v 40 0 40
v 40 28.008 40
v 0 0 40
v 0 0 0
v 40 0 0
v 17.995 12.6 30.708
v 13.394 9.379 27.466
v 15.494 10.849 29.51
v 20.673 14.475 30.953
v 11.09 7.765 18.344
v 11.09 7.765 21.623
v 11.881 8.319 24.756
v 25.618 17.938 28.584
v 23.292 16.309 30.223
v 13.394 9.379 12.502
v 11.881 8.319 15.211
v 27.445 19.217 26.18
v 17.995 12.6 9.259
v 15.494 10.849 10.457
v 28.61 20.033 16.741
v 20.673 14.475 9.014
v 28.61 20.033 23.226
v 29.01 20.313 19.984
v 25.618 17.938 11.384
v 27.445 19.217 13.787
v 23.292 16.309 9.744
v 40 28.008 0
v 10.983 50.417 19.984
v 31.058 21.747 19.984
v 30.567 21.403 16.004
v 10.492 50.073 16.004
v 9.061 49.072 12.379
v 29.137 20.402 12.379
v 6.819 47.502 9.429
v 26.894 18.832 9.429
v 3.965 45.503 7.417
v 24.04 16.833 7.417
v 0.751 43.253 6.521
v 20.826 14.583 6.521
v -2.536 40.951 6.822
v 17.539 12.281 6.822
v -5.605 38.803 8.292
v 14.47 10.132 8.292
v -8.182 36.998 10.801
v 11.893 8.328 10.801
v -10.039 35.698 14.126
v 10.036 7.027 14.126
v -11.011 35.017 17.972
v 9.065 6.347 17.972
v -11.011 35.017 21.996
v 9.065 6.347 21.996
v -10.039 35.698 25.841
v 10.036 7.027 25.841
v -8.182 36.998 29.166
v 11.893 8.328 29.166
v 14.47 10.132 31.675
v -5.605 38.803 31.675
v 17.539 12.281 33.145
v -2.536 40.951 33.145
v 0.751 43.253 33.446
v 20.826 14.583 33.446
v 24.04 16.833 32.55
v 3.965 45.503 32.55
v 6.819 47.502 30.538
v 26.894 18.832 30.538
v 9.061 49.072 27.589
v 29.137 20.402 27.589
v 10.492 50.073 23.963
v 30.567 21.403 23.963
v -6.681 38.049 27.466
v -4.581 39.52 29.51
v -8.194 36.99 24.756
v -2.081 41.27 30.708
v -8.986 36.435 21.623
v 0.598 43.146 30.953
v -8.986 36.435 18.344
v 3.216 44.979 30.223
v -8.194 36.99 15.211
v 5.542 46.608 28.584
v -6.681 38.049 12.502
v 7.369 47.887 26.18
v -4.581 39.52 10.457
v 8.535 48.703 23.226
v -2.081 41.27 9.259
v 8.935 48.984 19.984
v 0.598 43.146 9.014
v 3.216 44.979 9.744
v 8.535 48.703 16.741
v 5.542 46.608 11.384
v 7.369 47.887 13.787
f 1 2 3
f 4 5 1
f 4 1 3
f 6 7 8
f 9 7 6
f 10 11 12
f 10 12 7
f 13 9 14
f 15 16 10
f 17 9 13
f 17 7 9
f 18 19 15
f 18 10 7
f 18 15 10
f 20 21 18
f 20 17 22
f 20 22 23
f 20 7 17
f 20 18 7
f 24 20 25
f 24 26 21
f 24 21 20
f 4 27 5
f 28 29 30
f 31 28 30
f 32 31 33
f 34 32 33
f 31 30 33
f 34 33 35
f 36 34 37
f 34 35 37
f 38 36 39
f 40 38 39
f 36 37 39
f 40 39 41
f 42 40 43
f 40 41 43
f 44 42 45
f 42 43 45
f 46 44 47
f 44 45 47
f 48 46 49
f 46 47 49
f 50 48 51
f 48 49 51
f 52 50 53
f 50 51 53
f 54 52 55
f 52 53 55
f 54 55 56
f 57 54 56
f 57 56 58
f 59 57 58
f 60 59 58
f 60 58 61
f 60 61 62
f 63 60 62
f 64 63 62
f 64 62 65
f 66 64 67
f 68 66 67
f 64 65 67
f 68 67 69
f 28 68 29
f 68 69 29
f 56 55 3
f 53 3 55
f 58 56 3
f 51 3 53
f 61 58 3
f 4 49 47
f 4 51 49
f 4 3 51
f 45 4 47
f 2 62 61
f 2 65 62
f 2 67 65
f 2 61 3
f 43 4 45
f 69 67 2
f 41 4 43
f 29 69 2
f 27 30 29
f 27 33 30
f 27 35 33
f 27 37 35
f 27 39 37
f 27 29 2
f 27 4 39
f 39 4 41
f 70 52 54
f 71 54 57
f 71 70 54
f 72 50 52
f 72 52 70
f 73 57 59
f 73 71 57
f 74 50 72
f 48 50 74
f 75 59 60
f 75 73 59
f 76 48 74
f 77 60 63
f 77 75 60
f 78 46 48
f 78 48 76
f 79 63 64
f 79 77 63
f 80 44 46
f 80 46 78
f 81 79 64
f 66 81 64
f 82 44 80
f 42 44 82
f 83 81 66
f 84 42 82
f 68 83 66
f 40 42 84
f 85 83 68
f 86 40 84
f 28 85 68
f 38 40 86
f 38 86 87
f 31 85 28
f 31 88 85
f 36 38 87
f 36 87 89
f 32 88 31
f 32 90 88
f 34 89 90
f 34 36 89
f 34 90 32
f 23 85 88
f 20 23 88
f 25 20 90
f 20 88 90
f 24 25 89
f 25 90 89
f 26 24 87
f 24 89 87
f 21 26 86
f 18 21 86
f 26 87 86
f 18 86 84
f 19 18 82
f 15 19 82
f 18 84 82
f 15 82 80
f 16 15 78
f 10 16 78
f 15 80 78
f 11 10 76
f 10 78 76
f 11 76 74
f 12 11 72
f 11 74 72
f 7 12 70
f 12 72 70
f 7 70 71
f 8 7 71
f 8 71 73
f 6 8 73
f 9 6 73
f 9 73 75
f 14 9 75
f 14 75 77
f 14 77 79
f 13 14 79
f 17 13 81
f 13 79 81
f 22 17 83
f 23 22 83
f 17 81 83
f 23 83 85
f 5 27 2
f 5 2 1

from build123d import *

# Parameters (mm, degrees)
BOSS_EXTRUDE1_DEPTH = 40
SKETCH3_R           = 13.5
BOSS_EXTRUDE2_DEPTH = 35
SKETCH4_R           = 11
CUT_EXTRUDE1_DEPTH  = 35


with BuildPart() as part:
    # Sketch2 → Boss-Extrude1 (new body)
    with BuildSketch(Plane.XY):
        Polygon((0, 0), (40, 28.008301528), (40, 0), align=None)
    extrude(amount=BOSS_EXTRUDE1_DEPTH)

    # Sketch3 → Boss-Extrude2 (add)
    with BuildSketch(Plane(origin=(0, 0, 0), x_dir=(0.819152044, 0.573576436, 0), z_dir=(-0.573576436, 0.819152044, 0))):
        with Locations((24.415, -19.983681398)):
            Circle(SKETCH3_R)
    extrude(amount=BOSS_EXTRUDE2_DEPTH)

    # Sketch4 → Cut-Extrude1 (cut)
    with BuildSketch(Plane(origin=(-20.075175272, 28.67032155, 0), x_dir=(0.819152044, 0.573576436, 0), z_dir=(-0.573576436, 0.819152044, 0))):
        with Locations((24.415, -19.983681398)):
            Circle(SKETCH4_R)
    extrude(amount=-CUT_EXTRUDE1_DEPTH, mode=Mode.SUBTRACT)


solid = part.part
